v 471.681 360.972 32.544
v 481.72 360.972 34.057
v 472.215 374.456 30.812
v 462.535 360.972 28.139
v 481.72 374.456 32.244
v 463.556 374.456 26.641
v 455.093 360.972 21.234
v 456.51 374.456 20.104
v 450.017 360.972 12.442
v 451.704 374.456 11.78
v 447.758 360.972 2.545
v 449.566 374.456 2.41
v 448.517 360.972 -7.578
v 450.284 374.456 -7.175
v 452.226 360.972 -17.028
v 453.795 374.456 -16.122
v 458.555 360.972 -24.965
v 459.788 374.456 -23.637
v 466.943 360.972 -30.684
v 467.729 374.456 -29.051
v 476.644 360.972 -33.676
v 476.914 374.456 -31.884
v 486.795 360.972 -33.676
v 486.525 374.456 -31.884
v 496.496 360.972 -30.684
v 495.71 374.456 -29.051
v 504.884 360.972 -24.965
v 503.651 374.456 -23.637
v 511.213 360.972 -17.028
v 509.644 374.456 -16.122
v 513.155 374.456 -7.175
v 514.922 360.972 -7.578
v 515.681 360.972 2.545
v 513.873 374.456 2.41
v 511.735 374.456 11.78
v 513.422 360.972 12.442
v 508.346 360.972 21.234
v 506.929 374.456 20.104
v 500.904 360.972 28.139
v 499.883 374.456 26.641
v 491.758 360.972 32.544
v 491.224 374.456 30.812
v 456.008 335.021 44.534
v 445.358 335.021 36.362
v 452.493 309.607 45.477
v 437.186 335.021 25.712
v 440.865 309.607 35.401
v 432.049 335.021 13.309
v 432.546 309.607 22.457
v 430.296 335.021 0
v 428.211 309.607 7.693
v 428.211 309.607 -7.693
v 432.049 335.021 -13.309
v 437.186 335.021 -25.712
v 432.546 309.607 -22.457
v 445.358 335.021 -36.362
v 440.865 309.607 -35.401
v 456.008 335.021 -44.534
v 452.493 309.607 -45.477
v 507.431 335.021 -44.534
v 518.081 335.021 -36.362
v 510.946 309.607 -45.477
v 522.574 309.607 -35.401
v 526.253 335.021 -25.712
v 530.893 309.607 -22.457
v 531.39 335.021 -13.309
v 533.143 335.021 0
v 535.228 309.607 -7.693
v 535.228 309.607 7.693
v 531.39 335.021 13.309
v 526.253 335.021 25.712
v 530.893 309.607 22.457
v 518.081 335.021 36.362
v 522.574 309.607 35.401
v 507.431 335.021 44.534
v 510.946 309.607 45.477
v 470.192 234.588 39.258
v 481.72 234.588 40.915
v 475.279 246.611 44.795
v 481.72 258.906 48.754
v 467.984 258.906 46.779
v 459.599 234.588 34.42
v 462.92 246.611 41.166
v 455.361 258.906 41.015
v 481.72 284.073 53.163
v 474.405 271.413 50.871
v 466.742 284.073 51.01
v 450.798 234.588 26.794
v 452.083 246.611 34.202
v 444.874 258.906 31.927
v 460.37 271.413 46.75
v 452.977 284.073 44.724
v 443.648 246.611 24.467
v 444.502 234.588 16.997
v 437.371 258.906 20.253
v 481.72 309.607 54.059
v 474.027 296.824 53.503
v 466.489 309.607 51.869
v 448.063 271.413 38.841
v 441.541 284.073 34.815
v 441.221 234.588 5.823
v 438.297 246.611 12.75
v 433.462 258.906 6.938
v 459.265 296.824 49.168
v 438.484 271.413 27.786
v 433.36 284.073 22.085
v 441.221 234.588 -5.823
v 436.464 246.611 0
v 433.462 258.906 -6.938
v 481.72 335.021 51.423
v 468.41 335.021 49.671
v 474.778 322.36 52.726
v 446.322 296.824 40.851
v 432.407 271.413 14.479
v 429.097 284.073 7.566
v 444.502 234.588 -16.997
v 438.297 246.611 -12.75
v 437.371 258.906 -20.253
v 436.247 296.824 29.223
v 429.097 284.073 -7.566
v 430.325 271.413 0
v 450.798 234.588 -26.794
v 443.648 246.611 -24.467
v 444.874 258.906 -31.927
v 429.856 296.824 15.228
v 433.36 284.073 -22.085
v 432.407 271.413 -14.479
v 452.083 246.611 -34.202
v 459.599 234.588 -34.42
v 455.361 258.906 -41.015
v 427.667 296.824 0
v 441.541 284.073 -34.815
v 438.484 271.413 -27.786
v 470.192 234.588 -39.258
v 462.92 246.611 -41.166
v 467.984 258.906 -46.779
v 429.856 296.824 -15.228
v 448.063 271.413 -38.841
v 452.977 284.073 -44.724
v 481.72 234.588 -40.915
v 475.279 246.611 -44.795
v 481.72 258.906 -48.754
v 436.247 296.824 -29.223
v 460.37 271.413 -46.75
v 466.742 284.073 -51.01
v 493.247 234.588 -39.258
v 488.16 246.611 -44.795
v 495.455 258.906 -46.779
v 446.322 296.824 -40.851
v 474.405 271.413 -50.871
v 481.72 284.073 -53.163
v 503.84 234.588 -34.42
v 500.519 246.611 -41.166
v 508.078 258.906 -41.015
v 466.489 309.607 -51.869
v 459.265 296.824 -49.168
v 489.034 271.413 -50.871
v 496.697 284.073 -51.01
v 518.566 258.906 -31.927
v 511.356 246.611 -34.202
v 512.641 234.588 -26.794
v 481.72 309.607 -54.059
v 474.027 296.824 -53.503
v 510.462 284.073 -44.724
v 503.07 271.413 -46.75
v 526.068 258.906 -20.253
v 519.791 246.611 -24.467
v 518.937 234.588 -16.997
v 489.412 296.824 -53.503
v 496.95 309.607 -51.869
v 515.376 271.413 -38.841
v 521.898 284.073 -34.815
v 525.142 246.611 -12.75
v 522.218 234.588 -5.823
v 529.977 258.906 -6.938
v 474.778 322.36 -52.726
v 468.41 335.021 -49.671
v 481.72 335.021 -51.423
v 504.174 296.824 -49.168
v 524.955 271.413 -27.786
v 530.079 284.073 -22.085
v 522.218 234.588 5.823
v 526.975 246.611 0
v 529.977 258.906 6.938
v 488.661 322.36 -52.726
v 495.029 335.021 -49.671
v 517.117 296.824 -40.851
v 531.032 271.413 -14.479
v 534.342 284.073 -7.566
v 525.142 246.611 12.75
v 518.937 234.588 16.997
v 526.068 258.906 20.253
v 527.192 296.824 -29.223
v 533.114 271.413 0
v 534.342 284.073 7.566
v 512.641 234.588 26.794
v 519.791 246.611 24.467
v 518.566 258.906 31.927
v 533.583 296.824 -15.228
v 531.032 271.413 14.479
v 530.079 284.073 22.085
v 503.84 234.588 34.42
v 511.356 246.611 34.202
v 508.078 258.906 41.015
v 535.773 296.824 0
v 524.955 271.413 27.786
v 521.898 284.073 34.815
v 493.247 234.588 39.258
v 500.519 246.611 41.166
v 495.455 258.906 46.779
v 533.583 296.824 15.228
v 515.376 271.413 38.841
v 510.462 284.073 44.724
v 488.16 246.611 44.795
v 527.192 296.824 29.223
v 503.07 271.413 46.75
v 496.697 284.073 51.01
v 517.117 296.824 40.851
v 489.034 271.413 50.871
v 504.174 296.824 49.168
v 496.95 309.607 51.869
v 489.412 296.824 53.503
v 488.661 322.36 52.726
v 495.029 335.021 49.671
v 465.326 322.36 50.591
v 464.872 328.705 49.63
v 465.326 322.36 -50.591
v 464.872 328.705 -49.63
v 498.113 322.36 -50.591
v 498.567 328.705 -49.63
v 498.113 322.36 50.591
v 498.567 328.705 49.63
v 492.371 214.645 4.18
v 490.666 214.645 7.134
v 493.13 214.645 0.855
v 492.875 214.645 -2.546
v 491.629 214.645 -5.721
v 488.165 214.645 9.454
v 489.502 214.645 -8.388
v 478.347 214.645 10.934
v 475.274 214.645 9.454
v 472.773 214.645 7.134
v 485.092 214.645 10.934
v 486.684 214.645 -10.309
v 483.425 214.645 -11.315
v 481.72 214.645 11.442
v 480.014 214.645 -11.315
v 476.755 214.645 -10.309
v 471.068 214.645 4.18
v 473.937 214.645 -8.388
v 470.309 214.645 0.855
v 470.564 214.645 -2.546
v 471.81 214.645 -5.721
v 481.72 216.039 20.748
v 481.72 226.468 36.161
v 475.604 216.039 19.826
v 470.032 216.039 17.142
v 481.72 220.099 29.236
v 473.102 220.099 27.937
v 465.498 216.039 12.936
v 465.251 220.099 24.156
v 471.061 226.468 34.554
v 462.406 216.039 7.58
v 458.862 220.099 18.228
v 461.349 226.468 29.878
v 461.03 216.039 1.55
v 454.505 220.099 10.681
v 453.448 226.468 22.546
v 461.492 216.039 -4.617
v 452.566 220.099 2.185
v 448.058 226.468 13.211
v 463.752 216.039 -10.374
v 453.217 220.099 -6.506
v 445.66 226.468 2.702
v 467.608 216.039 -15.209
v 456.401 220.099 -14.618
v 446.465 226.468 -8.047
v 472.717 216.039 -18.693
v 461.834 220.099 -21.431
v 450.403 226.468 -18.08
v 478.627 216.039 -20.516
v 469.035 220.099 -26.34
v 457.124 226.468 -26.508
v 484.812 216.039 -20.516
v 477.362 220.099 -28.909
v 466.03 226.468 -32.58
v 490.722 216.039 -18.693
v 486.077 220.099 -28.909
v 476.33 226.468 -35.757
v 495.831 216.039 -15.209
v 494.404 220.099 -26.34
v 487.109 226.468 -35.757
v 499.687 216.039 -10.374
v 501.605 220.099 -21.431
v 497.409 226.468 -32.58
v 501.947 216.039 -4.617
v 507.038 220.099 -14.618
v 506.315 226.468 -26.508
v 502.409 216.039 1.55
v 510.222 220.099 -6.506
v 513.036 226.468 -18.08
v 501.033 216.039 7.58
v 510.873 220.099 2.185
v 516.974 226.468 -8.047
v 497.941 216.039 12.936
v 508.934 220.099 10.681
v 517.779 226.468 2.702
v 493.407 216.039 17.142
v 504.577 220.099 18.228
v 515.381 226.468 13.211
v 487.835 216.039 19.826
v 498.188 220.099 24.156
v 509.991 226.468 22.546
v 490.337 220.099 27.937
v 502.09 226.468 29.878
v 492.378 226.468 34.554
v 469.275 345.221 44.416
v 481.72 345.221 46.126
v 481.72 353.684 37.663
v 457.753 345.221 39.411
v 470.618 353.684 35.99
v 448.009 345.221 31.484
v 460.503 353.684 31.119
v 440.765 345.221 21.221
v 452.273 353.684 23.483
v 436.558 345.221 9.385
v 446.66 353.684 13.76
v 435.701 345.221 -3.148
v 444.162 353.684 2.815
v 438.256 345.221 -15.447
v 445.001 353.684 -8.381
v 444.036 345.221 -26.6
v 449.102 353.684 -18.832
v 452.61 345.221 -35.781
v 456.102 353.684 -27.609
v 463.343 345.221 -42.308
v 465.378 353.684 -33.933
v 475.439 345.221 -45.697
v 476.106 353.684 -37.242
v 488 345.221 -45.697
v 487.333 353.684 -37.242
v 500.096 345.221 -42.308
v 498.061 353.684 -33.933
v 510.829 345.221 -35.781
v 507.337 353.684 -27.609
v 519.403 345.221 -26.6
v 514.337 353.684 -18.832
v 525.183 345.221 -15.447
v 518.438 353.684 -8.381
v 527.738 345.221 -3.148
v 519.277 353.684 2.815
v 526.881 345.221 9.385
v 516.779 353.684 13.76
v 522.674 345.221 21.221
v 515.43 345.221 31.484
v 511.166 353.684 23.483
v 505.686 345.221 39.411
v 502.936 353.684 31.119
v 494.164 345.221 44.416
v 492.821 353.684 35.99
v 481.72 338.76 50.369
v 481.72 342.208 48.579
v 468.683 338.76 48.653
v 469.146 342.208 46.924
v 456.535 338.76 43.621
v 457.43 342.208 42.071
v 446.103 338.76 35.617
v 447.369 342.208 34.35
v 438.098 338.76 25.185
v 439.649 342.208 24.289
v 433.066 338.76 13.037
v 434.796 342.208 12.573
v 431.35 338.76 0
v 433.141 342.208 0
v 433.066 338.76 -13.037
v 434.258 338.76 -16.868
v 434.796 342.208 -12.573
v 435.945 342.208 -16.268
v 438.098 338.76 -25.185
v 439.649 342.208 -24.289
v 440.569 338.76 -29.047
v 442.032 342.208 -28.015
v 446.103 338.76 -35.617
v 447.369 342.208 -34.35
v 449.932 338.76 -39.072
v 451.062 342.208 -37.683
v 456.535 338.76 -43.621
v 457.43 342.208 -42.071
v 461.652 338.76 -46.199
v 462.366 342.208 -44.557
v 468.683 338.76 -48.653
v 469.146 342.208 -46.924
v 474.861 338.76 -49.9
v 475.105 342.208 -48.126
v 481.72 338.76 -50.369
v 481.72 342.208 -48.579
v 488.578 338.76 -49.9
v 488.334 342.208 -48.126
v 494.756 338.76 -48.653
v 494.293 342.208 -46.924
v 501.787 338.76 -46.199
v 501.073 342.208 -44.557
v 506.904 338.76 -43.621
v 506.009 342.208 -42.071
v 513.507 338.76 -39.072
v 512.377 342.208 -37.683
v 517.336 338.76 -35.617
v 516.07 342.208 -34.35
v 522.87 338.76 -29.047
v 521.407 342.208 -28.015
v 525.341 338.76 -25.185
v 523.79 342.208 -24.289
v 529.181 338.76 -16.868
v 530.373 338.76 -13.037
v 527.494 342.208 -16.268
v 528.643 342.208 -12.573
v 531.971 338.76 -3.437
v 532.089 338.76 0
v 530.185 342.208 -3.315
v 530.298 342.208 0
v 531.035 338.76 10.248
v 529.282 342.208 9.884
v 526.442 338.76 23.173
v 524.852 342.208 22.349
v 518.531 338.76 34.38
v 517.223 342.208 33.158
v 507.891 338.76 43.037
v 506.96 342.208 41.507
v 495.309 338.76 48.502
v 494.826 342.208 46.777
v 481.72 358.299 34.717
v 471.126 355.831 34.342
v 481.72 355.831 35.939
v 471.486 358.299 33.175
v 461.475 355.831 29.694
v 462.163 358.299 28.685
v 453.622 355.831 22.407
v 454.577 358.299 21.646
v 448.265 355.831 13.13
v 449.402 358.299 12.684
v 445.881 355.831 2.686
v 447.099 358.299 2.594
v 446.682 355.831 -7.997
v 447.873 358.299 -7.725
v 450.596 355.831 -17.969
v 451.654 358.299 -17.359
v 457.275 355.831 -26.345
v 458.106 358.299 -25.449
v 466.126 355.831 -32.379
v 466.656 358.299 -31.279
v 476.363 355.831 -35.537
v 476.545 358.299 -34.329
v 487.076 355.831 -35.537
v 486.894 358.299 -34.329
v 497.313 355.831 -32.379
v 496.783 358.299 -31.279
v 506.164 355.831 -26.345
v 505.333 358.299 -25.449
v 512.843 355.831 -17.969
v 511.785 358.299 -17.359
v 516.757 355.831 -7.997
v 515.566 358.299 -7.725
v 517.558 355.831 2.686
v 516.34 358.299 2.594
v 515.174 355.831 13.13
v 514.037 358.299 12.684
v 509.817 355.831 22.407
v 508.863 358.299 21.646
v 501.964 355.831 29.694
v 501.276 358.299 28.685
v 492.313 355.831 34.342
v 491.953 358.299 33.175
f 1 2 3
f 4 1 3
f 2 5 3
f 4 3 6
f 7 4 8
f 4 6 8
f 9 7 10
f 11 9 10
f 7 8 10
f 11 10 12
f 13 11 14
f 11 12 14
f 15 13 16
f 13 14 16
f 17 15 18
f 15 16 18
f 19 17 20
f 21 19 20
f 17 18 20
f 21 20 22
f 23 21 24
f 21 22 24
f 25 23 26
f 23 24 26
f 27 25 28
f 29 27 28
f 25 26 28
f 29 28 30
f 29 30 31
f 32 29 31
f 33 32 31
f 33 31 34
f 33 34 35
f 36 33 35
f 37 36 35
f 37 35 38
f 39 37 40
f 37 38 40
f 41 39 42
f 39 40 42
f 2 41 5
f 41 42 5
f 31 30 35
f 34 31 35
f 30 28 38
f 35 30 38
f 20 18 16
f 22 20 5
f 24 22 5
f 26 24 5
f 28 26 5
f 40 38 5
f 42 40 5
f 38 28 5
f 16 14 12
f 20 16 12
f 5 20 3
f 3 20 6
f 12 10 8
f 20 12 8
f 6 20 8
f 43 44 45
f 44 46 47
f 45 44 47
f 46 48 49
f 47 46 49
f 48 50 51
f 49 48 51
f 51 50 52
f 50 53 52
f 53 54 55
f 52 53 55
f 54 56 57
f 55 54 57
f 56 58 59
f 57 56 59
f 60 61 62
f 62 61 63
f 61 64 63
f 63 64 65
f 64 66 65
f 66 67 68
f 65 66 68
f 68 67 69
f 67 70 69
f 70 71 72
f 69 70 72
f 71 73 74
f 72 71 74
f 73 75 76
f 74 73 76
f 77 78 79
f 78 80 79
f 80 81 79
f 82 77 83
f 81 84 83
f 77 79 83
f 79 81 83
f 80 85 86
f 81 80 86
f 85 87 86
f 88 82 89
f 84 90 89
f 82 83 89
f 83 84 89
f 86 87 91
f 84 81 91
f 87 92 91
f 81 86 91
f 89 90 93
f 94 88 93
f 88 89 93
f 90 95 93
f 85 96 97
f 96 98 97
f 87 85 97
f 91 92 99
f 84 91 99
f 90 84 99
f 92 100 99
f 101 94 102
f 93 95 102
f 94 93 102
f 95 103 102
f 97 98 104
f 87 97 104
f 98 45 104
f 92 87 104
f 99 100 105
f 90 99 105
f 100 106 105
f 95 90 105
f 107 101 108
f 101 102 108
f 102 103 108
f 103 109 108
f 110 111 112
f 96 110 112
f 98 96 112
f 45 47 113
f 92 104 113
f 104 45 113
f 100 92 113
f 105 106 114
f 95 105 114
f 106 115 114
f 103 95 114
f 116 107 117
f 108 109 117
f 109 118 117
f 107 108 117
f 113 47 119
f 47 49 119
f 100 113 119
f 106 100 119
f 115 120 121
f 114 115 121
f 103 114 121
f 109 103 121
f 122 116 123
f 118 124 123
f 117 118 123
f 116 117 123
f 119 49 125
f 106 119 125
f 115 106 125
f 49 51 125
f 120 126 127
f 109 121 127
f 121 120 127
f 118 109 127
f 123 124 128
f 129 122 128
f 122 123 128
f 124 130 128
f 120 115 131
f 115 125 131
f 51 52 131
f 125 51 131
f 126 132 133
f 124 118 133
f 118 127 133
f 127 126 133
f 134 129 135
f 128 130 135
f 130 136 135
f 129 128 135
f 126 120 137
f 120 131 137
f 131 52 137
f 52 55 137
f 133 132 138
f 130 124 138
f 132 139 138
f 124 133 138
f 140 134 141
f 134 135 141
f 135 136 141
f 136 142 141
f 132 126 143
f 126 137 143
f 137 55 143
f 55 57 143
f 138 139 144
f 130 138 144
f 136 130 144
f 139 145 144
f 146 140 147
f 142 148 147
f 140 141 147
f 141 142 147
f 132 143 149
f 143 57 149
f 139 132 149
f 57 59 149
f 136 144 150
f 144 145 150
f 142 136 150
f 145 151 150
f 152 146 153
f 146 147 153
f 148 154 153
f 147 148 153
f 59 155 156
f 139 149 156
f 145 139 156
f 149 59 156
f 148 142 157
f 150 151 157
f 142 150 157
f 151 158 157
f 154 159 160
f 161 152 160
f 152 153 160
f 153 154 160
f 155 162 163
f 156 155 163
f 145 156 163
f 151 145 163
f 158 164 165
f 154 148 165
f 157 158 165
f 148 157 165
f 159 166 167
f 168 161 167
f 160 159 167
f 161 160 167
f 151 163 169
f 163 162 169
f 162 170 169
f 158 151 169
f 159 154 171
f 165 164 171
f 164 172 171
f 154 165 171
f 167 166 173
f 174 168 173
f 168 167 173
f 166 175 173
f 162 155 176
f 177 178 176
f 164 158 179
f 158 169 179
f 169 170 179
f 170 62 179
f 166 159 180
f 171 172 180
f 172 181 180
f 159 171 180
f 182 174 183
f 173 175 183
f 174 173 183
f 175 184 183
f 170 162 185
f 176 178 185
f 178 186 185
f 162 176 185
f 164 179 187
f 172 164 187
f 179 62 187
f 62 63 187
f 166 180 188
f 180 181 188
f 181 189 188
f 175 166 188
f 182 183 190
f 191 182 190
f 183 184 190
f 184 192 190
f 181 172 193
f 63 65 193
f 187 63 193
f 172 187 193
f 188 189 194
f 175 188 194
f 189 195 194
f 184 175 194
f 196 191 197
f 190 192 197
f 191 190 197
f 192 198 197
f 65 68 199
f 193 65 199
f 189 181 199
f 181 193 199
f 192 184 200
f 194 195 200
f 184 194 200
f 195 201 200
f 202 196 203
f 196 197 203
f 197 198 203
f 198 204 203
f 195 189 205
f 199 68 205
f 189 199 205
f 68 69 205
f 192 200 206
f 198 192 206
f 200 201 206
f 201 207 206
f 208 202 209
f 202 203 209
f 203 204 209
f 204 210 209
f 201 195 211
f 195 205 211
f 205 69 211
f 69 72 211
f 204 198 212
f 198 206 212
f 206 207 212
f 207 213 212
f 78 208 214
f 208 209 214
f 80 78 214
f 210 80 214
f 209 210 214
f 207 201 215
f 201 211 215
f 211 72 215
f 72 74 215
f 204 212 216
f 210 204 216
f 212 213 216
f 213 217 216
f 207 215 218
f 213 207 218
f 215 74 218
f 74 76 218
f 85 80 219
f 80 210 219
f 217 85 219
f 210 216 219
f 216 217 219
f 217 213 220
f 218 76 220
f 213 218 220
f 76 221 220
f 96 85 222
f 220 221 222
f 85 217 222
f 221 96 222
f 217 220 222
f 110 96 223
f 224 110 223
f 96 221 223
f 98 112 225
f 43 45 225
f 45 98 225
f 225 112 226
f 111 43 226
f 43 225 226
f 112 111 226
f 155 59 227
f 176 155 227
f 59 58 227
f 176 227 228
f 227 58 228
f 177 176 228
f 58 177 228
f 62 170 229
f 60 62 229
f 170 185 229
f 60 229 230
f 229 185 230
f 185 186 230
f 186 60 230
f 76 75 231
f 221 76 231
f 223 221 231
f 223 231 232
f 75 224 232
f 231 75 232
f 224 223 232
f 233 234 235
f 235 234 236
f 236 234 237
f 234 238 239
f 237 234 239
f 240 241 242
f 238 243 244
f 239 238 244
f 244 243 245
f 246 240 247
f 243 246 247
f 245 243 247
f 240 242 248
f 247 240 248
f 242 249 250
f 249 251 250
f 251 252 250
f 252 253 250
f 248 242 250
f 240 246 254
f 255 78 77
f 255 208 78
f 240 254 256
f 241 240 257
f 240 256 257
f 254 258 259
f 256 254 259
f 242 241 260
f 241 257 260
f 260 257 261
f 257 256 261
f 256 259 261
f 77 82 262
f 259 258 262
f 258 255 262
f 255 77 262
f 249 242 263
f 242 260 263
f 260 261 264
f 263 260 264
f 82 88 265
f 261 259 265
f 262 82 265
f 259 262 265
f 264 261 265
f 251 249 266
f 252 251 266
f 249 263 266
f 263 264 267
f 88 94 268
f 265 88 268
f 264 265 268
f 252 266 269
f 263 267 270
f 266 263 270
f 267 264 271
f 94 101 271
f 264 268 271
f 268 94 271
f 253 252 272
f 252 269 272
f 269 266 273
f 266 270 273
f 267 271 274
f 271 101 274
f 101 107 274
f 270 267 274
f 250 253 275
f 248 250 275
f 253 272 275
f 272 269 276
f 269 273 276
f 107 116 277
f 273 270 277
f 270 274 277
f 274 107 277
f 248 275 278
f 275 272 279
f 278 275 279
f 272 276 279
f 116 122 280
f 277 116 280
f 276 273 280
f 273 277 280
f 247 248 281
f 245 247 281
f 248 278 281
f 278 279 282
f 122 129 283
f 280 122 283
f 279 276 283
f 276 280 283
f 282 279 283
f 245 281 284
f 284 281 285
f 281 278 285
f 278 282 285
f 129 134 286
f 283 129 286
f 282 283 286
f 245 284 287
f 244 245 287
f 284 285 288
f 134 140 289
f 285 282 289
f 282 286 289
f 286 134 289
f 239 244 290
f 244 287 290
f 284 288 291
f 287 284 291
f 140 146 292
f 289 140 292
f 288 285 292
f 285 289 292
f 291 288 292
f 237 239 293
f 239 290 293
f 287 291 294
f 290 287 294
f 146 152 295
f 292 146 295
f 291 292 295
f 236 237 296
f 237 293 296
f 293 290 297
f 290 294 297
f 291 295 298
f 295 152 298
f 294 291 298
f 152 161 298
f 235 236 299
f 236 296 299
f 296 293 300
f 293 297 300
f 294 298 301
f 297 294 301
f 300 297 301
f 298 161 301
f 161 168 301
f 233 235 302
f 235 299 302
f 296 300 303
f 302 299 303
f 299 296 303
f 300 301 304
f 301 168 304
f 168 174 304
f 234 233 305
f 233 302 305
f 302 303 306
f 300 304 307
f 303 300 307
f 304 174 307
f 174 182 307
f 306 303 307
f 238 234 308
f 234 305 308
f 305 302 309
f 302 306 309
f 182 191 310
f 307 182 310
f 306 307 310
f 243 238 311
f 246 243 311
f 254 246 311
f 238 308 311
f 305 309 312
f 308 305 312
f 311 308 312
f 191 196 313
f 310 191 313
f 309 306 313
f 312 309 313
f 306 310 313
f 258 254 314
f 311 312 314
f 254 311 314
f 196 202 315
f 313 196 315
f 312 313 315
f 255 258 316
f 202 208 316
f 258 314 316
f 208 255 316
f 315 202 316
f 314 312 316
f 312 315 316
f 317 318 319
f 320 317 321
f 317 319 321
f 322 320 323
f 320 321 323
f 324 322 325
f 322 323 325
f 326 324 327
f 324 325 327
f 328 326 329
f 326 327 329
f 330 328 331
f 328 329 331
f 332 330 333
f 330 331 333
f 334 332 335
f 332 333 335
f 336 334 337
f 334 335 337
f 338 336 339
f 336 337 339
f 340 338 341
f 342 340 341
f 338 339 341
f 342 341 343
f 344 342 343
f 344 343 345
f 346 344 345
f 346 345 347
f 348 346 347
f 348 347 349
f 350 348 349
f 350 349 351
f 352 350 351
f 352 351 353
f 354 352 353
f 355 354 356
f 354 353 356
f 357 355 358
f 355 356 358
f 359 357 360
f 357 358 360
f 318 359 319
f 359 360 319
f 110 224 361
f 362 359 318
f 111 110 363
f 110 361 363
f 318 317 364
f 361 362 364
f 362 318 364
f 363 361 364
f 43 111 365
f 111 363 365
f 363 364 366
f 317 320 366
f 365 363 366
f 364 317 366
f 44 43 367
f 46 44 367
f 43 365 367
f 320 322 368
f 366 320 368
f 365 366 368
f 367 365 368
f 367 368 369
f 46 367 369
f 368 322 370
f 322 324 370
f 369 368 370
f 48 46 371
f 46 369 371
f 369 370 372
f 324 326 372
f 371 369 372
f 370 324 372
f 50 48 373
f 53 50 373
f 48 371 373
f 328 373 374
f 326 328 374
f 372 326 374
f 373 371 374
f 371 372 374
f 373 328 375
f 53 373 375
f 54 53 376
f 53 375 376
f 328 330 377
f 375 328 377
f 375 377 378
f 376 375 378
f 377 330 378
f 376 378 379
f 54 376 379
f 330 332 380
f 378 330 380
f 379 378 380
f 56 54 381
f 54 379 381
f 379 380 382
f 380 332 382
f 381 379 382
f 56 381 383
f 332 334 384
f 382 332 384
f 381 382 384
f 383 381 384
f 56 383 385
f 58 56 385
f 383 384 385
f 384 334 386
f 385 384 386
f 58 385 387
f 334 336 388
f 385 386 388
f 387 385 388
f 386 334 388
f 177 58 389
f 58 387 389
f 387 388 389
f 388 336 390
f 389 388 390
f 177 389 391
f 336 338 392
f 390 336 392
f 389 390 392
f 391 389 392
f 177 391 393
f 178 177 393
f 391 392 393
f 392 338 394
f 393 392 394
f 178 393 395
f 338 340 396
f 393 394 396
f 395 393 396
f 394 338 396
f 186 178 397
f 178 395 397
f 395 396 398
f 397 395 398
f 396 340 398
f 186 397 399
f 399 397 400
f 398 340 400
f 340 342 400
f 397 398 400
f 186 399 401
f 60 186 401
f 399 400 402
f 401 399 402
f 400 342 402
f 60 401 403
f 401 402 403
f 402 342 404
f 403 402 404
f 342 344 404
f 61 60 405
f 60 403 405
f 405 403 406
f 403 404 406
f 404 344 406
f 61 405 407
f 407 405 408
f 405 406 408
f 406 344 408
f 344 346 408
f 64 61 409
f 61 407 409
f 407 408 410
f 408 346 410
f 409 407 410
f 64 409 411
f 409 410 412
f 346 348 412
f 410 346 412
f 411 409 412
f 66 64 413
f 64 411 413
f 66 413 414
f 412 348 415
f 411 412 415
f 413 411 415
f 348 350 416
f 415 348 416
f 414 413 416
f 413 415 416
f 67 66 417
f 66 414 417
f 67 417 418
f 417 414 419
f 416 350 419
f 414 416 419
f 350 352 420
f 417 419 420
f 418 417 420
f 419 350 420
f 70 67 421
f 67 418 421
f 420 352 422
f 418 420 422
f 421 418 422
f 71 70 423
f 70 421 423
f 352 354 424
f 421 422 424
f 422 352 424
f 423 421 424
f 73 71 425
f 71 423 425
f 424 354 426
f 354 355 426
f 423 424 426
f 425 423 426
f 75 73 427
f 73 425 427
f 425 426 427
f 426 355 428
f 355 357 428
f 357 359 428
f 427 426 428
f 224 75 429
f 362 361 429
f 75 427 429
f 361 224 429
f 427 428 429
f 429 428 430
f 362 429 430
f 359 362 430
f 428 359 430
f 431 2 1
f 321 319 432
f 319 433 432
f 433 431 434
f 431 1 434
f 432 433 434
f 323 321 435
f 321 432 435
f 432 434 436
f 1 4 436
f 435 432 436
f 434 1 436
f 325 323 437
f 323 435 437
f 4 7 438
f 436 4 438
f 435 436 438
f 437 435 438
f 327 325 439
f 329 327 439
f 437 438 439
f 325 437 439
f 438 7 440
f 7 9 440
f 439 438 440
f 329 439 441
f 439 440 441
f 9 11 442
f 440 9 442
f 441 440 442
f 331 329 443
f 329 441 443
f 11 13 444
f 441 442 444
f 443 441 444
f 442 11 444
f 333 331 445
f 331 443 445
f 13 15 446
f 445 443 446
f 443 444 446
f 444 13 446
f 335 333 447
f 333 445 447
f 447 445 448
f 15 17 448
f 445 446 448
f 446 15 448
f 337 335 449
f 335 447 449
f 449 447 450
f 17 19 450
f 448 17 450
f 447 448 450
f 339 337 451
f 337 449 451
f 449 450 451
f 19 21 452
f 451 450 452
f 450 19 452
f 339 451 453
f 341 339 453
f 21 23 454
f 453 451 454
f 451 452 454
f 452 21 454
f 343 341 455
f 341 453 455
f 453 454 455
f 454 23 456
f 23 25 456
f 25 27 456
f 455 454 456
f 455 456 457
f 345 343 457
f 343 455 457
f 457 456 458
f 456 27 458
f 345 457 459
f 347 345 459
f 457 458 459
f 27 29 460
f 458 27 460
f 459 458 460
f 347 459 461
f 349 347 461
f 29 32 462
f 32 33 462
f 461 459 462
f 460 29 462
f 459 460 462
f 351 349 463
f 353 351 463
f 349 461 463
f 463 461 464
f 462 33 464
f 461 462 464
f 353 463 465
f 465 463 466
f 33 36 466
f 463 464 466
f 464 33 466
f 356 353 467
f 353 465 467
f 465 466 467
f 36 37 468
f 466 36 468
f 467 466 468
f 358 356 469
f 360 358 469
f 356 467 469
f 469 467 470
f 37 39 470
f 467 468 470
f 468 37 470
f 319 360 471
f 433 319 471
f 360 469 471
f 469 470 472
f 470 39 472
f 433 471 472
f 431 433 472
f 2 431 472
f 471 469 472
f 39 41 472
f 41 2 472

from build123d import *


with BuildPart() as part:
    # Sketch3 → Revolve2 (revolve)
    with BuildSketch(Plane.XY, mode=Mode.PRIVATE) as revolve2_sk:
        with BuildLine():
            Line((527.845824353, 345.220801965), (519.382659671, 353.683966647))
            ThreePointArc((519.382659671, 353.683966647), (516.980270901, 357.031692672), (515.776115024, 360.972346166))
            Line((515.776115024, 360.972346166), (513.96365509, 374.456232673))
            Line((513.96365509, 374.456232673), (481.719516666, 374.456232673))
            Line((481.719516666, 374.456232673), (481.719516666, 214.64452317))
            Line((481.719516666, 214.64452317), (493.161907992, 214.64452317))
            ThreePointArc((493.161907992, 214.64452317), (510.955066032, 220.098781557), (522.6349339, 234.587608086))
            ThreePointArc((522.6349339, 234.587608086), (534.882960602, 284.072522551), (533.142595858, 335.020947926))
            ThreePointArc((533.142595858, 335.020947926), (531.281770341, 340.529853995), (527.845824353, 345.220801965))
        make_face()
    revolve(revolve2_sk.sketch.rotate(Axis((481.719516666, 374.456232673, 0), (0, -1, 0)), 90), axis=Axis((481.719516666, 374.456232673, 0), (0, -1, 0)))


solid = part.part
